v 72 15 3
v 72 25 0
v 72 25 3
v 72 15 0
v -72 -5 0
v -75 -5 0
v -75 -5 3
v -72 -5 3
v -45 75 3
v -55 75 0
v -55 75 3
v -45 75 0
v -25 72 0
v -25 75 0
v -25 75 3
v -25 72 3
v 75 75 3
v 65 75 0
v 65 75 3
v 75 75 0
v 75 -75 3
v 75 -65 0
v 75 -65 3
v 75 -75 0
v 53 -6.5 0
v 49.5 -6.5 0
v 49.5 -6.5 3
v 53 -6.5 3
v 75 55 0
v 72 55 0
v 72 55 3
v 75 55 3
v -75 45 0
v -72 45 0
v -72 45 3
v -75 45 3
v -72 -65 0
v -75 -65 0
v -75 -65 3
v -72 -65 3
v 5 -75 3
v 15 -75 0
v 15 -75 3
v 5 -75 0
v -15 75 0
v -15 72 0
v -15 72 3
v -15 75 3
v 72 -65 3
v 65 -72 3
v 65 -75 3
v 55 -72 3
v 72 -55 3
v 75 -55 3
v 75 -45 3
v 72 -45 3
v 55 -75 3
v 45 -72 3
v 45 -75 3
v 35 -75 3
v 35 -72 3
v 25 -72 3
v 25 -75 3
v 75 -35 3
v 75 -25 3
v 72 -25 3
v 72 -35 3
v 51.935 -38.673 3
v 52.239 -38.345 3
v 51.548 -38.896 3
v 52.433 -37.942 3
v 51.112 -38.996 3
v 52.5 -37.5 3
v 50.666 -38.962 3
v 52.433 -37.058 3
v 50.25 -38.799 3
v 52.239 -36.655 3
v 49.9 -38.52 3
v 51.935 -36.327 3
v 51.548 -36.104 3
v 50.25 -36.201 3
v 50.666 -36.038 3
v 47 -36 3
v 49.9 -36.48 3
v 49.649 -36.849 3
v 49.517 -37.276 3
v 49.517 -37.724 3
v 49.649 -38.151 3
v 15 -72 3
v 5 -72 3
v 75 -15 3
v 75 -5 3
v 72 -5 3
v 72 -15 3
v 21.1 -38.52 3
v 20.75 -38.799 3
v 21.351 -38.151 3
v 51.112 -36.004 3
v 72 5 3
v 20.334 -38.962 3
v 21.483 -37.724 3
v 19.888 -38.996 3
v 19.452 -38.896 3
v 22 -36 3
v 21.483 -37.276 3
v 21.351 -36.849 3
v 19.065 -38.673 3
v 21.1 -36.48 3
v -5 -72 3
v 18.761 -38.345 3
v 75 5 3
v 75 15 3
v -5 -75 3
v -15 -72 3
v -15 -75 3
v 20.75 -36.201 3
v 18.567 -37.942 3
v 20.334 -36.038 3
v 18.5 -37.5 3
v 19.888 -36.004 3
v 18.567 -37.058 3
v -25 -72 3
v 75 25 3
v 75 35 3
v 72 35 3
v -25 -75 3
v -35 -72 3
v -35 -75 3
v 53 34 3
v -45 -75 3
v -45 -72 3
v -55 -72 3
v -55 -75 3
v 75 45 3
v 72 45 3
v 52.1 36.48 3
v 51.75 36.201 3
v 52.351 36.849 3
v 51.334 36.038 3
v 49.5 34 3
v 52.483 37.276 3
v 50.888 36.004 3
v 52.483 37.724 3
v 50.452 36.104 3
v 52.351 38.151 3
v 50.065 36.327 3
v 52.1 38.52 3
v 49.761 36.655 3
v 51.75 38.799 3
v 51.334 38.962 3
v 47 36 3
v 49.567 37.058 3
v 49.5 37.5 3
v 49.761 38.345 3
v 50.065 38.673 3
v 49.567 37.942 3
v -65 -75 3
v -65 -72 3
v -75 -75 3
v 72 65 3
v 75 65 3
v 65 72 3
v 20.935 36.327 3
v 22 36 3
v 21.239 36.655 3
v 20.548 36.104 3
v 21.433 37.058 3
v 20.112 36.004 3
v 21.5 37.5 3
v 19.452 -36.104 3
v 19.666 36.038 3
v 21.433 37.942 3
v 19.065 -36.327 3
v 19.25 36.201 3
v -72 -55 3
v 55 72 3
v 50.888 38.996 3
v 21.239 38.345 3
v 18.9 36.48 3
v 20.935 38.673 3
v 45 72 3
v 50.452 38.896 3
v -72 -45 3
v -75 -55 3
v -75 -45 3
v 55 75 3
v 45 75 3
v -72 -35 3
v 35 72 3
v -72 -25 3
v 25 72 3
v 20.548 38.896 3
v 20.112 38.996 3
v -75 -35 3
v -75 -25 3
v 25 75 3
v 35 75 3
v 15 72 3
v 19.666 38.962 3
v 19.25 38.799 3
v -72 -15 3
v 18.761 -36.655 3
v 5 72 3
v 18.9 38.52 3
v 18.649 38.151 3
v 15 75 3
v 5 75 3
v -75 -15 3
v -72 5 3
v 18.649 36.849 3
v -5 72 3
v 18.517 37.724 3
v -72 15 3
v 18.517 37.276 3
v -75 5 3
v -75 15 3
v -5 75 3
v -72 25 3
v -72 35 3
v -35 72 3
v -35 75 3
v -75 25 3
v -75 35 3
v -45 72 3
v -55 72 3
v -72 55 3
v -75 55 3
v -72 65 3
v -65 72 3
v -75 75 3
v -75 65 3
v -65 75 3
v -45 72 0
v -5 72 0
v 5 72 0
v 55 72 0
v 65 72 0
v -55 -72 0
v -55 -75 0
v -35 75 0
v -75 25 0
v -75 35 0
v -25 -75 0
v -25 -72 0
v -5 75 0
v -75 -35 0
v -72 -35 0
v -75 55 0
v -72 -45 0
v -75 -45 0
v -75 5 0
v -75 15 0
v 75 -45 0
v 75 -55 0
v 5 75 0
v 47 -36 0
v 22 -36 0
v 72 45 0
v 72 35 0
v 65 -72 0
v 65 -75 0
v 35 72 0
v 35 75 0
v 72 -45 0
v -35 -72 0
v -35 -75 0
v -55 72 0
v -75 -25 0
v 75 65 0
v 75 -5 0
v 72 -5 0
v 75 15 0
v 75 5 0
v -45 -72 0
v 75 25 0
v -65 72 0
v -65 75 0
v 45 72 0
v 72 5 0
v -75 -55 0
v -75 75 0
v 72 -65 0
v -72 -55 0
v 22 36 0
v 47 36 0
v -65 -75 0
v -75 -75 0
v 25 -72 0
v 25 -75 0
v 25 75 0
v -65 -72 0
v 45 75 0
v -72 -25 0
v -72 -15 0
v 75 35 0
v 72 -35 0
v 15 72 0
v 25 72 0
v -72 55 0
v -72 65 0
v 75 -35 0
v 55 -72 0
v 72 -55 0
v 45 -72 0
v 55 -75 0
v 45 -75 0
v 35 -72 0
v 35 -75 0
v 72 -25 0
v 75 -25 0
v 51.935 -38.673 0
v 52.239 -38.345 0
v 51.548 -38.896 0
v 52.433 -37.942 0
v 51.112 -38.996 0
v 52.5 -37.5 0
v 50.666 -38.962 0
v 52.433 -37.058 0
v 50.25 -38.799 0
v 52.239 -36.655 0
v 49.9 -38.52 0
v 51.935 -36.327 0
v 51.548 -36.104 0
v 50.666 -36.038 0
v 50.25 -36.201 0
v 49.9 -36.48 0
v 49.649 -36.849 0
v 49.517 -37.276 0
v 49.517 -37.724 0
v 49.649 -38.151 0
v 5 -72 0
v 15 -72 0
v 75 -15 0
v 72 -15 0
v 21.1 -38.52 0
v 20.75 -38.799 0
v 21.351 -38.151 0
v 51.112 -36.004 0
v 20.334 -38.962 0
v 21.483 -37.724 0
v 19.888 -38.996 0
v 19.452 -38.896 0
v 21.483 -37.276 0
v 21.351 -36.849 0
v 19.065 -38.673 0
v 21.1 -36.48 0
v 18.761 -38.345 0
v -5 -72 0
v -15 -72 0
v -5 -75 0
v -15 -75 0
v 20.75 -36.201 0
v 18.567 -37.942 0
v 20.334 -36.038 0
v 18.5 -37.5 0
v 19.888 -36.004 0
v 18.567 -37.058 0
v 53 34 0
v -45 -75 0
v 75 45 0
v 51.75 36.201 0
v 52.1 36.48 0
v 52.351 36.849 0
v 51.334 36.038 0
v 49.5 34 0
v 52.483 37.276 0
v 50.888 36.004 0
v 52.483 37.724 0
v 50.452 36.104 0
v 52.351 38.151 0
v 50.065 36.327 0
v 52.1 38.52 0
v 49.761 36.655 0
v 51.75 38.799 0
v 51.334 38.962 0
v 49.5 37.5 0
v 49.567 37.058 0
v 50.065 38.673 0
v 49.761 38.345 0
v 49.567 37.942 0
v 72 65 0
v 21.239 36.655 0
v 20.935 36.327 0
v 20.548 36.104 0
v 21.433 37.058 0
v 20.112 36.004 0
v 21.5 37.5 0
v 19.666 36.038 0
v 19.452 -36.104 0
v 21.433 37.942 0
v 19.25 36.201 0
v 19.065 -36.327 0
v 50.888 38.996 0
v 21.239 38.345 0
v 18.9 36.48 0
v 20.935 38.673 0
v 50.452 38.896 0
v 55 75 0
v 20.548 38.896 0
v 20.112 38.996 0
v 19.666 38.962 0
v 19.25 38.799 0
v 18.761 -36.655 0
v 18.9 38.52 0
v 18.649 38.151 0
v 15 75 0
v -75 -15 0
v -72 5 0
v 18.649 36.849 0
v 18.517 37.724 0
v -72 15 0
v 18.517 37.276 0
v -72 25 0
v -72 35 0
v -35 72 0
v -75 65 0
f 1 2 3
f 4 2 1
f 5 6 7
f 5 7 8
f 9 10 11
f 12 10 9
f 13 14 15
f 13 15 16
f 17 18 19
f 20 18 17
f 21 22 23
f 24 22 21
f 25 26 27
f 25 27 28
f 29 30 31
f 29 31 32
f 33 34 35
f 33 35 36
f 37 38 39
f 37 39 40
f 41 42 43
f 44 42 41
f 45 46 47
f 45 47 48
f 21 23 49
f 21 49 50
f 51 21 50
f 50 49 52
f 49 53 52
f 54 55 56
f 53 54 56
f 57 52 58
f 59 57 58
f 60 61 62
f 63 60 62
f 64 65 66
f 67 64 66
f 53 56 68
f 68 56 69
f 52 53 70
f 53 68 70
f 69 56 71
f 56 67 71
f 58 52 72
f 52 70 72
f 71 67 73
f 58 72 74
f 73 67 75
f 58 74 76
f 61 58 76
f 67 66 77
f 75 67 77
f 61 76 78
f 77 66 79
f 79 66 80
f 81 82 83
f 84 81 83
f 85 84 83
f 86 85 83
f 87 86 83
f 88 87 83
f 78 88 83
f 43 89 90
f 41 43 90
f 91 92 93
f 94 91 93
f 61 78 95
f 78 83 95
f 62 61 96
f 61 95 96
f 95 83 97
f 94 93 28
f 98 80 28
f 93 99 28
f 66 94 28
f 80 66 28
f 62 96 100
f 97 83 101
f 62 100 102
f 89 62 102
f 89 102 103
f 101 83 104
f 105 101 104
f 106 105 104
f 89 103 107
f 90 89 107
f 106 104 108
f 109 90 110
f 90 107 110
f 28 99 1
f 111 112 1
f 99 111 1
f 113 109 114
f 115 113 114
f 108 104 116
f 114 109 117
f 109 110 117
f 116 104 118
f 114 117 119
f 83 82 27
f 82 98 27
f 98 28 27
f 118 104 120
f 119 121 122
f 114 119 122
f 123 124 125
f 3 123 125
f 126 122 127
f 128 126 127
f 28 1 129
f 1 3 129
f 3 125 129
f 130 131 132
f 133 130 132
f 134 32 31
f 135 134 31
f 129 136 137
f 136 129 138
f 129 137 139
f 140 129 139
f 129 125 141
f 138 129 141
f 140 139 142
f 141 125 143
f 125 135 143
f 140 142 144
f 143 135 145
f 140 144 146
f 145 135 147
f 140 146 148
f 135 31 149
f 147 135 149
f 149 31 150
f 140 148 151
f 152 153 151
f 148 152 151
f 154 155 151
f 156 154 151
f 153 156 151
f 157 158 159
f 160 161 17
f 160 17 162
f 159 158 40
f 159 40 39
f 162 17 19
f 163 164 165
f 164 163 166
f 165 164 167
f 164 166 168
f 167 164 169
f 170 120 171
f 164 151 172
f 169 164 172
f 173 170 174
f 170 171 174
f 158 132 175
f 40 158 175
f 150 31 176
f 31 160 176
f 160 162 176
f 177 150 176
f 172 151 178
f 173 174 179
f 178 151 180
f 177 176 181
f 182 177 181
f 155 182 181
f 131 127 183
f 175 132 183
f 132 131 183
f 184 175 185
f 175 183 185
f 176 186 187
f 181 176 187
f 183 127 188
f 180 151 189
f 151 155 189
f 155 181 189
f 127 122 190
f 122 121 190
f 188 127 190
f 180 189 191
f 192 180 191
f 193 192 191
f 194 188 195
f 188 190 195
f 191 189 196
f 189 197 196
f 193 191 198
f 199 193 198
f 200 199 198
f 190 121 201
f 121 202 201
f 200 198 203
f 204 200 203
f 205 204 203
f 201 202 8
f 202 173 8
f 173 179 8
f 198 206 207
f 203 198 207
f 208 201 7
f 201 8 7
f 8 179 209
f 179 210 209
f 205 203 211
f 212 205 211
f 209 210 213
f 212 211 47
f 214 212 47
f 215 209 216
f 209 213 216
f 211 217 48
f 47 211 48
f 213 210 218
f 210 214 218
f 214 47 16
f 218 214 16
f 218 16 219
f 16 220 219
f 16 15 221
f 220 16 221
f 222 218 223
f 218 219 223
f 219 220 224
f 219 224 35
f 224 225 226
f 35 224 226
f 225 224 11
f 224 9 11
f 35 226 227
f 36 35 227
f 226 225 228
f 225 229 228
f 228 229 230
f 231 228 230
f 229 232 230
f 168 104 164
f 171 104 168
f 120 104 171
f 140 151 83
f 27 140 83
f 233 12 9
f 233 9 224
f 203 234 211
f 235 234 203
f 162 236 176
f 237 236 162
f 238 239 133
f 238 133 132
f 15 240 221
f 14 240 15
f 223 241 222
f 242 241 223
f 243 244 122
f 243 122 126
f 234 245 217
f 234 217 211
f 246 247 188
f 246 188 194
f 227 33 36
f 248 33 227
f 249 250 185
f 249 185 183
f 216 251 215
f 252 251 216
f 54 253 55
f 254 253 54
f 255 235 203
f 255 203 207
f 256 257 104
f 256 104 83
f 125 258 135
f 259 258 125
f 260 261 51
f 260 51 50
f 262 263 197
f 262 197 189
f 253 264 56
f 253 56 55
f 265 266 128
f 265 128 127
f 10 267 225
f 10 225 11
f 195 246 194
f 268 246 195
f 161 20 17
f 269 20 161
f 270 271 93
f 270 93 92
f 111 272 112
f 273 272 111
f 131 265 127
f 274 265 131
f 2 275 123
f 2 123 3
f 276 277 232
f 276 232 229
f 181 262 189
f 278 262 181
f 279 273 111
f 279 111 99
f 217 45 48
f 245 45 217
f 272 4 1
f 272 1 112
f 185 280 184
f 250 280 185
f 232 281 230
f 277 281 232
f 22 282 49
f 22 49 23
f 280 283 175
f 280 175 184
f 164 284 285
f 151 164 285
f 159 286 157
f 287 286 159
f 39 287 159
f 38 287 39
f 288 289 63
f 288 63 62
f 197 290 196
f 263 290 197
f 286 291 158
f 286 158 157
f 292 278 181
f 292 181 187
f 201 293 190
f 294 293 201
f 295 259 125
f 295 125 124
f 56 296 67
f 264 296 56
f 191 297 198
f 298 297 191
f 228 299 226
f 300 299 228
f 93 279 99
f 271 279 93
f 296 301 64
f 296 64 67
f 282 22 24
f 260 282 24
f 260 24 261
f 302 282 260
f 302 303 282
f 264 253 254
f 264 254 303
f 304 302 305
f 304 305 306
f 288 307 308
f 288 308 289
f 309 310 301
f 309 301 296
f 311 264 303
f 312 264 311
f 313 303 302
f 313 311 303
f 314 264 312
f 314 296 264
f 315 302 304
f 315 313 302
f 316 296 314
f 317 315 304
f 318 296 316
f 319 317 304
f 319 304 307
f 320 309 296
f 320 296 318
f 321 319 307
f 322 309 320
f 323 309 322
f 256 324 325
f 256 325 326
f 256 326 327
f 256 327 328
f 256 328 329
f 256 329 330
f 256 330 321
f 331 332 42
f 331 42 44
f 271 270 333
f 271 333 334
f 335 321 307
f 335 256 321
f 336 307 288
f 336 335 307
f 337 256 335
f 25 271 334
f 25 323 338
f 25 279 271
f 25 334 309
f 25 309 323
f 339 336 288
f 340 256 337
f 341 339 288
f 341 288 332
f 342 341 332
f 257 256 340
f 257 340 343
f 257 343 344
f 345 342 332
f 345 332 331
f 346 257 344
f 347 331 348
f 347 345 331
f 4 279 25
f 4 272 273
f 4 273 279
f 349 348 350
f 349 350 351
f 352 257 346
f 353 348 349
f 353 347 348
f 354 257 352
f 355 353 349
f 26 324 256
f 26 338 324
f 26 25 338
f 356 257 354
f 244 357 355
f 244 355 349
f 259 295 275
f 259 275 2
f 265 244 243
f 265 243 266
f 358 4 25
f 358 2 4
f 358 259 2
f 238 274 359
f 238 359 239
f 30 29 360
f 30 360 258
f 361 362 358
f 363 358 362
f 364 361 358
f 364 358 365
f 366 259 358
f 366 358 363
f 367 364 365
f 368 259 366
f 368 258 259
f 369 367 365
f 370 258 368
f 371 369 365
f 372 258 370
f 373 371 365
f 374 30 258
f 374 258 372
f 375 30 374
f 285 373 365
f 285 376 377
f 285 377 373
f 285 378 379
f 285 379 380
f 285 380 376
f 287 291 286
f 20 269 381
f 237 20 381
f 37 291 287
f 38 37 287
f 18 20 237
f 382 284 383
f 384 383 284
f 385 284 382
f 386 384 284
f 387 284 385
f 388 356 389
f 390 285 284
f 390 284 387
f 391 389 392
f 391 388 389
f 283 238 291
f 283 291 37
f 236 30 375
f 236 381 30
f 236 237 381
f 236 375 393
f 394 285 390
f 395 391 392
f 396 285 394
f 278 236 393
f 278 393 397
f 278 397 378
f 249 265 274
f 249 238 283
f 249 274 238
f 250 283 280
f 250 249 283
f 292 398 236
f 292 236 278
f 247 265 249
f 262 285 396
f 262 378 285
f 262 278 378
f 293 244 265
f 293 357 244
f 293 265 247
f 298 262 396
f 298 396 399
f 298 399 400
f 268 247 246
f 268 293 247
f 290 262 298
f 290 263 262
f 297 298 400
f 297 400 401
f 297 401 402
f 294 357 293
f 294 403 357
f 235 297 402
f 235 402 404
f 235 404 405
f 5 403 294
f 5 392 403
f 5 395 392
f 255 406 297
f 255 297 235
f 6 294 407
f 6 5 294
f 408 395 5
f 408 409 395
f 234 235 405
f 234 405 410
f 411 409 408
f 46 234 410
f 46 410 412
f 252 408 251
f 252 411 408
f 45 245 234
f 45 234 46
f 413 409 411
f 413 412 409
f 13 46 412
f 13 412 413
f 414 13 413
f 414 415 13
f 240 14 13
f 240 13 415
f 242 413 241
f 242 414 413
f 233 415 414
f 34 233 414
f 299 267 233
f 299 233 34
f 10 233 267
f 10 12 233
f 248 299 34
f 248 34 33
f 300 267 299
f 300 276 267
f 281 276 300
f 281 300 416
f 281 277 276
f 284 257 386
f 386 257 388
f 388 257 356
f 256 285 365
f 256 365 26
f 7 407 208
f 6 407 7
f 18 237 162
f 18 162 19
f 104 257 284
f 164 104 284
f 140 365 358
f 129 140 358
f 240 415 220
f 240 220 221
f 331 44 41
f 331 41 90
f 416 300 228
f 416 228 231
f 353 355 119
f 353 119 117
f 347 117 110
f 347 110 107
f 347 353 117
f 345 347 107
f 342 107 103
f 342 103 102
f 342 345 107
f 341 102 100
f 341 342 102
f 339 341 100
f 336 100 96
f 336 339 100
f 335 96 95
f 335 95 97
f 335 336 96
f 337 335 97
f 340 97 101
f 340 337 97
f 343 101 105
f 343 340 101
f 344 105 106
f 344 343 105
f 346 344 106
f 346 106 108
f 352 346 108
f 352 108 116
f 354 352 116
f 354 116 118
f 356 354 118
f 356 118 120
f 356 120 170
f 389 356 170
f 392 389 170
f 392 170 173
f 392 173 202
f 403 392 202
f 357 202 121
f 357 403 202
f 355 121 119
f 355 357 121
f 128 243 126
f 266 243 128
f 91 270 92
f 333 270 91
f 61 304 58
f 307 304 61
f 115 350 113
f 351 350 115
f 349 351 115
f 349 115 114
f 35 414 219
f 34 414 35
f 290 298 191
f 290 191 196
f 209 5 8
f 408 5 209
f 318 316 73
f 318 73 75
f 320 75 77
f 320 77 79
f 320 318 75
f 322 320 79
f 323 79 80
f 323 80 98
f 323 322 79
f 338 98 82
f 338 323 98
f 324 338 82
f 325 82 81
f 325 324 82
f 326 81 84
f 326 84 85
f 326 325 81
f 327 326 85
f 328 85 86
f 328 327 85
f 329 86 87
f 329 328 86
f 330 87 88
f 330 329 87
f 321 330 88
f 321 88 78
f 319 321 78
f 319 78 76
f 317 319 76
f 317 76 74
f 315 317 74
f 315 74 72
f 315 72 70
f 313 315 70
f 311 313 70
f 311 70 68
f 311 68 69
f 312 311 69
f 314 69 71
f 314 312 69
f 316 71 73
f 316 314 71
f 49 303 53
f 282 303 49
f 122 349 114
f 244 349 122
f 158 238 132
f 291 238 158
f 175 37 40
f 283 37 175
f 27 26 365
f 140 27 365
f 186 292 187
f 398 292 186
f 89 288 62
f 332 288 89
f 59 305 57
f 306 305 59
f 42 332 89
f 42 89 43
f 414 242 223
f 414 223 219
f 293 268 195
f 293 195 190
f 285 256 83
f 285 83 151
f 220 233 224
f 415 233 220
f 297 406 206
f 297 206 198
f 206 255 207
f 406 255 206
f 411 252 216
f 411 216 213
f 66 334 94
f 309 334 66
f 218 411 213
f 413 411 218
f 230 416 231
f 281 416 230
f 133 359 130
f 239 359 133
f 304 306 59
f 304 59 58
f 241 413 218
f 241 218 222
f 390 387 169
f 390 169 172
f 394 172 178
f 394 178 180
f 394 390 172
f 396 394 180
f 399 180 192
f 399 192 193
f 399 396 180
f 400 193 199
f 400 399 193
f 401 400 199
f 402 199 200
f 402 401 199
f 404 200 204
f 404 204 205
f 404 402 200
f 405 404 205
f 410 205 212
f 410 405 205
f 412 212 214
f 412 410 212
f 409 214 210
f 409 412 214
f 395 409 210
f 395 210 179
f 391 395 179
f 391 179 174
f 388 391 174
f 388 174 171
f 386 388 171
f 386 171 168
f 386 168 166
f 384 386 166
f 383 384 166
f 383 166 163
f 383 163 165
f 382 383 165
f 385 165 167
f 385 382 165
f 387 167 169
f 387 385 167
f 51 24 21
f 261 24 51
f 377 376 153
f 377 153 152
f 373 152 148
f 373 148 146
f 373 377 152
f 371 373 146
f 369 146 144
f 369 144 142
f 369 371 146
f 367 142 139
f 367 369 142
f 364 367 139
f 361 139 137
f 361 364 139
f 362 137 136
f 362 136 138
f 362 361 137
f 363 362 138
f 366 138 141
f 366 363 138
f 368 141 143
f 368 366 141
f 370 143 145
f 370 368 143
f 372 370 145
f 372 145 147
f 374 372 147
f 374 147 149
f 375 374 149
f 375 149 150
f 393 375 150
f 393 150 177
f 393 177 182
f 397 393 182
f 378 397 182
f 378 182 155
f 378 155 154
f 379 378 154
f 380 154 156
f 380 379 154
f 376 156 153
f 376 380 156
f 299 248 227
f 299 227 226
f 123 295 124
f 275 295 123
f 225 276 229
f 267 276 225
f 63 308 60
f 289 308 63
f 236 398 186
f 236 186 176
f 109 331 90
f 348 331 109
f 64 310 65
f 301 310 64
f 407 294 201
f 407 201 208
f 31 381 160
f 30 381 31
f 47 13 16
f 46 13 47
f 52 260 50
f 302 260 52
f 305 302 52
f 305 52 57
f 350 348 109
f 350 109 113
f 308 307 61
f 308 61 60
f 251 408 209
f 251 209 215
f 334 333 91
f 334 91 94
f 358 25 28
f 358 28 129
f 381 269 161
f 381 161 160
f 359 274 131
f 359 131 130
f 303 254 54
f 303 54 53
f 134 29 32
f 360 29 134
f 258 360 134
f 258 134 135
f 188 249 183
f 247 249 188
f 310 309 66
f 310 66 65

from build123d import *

# Parameters (mm, degrees)
CROQUIS1_R              = 1.5
CROQUIS1_W              = 25
CROQUIS1_H              = 72
CROQUIS1_W_2            = 3.5
CROQUIS1_H_2            = 40.5
SALIENTE_EXTRUIR1_DEPTH = 3


with BuildPart() as part:
    # Croquis1 → Saliente-Extruir1 (new body)
    with BuildSketch(Plane.XY):
        Polygon((-75, -75), (-75, -65), (-72, -65), (-72, -55), (-75, -55), (-75, -45), (-72, -45), (-72, -35), (-75, -35), (-75, -25), (-72, -25), (-72, -15), (-75, -15), (-75, -5), (-72, -5), (-72, 5), (-75, 5), (-75, 15), (-72, 15), (-72, 25), (-75, 25), (-75, 35), (-72, 35), (-72, 45), (-75, 45), (-75, 55), (-72, 55), (-72, 65), (-75, 65), (-75, 75), (-65, 75), (-65, 72), (-55, 72), (-55, 75), (-45, 75), (-45, 72), (-35, 72), (-35, 75), (-25, 75), (-25, 72), (-15, 72), (-15, 75), (-5, 75), (-5, 72), (5, 72), (5, 75), (15, 75), (15, 72), (25, 72), (25, 75), (35, 75), (35, 72), (45, 72), (45, 75), (55, 75), (55, 72), (65, 72), (65, 75), (75, 75), (75, 65), (72, 65), (72, 55), (75, 55), (75, 45), (72, 45), (72, 35), (75, 35), (75, 25), (72, 25), (72, 15), (75, 15), (75, 5), (72, 5), (72, -5), (75, -5), (75, -15), (72, -15), (72, -25), (75, -25), (75, -35), (72, -35), (72, -45), (75, -45), (75, -55), (72, -55), (72, -65), (75, -65), (75, -75), (65, -75), (65, -72), (55, -72), (55, -75), (45, -75), (45, -72), (35, -72), (35, -75), (25, -75), (25, -72), (15, -72), (15, -75), (5, -75), (5, -72), (-5, -72), (-5, -75), (-15, -75), (-15, -72), (-25, -72), (-25, -75), (-35, -75), (-35, -72), (-45, -72), (-45, -75), (-55, -75), (-55, -72), (-65, -72), (-65, -75), align=None)
        with Locations((20, 37.5)):
            Circle(CROQUIS1_R, mode=Mode.SUBTRACT)
        with Locations(Location((51, 37.5, 0), (0, 0, 180))):
            Circle(CROQUIS1_R, mode=Mode.SUBTRACT)
        with Locations((51, -37.5)):
            Circle(CROQUIS1_R, mode=Mode.SUBTRACT)
        with Locations(Location((20, -37.5, 0), (0, 0, 180))):
            Circle(CROQUIS1_R, mode=Mode.SUBTRACT)
        with Locations((34.5, 0)):
            Rectangle(CROQUIS1_W, CROQUIS1_H, mode=Mode.SUBTRACT)
        with Locations((51.25, 13.75)):
            Rectangle(CROQUIS1_W_2, CROQUIS1_H_2, mode=Mode.SUBTRACT)
    extrude(amount=SALIENTE_EXTRUIR1_DEPTH)


solid = part.part
